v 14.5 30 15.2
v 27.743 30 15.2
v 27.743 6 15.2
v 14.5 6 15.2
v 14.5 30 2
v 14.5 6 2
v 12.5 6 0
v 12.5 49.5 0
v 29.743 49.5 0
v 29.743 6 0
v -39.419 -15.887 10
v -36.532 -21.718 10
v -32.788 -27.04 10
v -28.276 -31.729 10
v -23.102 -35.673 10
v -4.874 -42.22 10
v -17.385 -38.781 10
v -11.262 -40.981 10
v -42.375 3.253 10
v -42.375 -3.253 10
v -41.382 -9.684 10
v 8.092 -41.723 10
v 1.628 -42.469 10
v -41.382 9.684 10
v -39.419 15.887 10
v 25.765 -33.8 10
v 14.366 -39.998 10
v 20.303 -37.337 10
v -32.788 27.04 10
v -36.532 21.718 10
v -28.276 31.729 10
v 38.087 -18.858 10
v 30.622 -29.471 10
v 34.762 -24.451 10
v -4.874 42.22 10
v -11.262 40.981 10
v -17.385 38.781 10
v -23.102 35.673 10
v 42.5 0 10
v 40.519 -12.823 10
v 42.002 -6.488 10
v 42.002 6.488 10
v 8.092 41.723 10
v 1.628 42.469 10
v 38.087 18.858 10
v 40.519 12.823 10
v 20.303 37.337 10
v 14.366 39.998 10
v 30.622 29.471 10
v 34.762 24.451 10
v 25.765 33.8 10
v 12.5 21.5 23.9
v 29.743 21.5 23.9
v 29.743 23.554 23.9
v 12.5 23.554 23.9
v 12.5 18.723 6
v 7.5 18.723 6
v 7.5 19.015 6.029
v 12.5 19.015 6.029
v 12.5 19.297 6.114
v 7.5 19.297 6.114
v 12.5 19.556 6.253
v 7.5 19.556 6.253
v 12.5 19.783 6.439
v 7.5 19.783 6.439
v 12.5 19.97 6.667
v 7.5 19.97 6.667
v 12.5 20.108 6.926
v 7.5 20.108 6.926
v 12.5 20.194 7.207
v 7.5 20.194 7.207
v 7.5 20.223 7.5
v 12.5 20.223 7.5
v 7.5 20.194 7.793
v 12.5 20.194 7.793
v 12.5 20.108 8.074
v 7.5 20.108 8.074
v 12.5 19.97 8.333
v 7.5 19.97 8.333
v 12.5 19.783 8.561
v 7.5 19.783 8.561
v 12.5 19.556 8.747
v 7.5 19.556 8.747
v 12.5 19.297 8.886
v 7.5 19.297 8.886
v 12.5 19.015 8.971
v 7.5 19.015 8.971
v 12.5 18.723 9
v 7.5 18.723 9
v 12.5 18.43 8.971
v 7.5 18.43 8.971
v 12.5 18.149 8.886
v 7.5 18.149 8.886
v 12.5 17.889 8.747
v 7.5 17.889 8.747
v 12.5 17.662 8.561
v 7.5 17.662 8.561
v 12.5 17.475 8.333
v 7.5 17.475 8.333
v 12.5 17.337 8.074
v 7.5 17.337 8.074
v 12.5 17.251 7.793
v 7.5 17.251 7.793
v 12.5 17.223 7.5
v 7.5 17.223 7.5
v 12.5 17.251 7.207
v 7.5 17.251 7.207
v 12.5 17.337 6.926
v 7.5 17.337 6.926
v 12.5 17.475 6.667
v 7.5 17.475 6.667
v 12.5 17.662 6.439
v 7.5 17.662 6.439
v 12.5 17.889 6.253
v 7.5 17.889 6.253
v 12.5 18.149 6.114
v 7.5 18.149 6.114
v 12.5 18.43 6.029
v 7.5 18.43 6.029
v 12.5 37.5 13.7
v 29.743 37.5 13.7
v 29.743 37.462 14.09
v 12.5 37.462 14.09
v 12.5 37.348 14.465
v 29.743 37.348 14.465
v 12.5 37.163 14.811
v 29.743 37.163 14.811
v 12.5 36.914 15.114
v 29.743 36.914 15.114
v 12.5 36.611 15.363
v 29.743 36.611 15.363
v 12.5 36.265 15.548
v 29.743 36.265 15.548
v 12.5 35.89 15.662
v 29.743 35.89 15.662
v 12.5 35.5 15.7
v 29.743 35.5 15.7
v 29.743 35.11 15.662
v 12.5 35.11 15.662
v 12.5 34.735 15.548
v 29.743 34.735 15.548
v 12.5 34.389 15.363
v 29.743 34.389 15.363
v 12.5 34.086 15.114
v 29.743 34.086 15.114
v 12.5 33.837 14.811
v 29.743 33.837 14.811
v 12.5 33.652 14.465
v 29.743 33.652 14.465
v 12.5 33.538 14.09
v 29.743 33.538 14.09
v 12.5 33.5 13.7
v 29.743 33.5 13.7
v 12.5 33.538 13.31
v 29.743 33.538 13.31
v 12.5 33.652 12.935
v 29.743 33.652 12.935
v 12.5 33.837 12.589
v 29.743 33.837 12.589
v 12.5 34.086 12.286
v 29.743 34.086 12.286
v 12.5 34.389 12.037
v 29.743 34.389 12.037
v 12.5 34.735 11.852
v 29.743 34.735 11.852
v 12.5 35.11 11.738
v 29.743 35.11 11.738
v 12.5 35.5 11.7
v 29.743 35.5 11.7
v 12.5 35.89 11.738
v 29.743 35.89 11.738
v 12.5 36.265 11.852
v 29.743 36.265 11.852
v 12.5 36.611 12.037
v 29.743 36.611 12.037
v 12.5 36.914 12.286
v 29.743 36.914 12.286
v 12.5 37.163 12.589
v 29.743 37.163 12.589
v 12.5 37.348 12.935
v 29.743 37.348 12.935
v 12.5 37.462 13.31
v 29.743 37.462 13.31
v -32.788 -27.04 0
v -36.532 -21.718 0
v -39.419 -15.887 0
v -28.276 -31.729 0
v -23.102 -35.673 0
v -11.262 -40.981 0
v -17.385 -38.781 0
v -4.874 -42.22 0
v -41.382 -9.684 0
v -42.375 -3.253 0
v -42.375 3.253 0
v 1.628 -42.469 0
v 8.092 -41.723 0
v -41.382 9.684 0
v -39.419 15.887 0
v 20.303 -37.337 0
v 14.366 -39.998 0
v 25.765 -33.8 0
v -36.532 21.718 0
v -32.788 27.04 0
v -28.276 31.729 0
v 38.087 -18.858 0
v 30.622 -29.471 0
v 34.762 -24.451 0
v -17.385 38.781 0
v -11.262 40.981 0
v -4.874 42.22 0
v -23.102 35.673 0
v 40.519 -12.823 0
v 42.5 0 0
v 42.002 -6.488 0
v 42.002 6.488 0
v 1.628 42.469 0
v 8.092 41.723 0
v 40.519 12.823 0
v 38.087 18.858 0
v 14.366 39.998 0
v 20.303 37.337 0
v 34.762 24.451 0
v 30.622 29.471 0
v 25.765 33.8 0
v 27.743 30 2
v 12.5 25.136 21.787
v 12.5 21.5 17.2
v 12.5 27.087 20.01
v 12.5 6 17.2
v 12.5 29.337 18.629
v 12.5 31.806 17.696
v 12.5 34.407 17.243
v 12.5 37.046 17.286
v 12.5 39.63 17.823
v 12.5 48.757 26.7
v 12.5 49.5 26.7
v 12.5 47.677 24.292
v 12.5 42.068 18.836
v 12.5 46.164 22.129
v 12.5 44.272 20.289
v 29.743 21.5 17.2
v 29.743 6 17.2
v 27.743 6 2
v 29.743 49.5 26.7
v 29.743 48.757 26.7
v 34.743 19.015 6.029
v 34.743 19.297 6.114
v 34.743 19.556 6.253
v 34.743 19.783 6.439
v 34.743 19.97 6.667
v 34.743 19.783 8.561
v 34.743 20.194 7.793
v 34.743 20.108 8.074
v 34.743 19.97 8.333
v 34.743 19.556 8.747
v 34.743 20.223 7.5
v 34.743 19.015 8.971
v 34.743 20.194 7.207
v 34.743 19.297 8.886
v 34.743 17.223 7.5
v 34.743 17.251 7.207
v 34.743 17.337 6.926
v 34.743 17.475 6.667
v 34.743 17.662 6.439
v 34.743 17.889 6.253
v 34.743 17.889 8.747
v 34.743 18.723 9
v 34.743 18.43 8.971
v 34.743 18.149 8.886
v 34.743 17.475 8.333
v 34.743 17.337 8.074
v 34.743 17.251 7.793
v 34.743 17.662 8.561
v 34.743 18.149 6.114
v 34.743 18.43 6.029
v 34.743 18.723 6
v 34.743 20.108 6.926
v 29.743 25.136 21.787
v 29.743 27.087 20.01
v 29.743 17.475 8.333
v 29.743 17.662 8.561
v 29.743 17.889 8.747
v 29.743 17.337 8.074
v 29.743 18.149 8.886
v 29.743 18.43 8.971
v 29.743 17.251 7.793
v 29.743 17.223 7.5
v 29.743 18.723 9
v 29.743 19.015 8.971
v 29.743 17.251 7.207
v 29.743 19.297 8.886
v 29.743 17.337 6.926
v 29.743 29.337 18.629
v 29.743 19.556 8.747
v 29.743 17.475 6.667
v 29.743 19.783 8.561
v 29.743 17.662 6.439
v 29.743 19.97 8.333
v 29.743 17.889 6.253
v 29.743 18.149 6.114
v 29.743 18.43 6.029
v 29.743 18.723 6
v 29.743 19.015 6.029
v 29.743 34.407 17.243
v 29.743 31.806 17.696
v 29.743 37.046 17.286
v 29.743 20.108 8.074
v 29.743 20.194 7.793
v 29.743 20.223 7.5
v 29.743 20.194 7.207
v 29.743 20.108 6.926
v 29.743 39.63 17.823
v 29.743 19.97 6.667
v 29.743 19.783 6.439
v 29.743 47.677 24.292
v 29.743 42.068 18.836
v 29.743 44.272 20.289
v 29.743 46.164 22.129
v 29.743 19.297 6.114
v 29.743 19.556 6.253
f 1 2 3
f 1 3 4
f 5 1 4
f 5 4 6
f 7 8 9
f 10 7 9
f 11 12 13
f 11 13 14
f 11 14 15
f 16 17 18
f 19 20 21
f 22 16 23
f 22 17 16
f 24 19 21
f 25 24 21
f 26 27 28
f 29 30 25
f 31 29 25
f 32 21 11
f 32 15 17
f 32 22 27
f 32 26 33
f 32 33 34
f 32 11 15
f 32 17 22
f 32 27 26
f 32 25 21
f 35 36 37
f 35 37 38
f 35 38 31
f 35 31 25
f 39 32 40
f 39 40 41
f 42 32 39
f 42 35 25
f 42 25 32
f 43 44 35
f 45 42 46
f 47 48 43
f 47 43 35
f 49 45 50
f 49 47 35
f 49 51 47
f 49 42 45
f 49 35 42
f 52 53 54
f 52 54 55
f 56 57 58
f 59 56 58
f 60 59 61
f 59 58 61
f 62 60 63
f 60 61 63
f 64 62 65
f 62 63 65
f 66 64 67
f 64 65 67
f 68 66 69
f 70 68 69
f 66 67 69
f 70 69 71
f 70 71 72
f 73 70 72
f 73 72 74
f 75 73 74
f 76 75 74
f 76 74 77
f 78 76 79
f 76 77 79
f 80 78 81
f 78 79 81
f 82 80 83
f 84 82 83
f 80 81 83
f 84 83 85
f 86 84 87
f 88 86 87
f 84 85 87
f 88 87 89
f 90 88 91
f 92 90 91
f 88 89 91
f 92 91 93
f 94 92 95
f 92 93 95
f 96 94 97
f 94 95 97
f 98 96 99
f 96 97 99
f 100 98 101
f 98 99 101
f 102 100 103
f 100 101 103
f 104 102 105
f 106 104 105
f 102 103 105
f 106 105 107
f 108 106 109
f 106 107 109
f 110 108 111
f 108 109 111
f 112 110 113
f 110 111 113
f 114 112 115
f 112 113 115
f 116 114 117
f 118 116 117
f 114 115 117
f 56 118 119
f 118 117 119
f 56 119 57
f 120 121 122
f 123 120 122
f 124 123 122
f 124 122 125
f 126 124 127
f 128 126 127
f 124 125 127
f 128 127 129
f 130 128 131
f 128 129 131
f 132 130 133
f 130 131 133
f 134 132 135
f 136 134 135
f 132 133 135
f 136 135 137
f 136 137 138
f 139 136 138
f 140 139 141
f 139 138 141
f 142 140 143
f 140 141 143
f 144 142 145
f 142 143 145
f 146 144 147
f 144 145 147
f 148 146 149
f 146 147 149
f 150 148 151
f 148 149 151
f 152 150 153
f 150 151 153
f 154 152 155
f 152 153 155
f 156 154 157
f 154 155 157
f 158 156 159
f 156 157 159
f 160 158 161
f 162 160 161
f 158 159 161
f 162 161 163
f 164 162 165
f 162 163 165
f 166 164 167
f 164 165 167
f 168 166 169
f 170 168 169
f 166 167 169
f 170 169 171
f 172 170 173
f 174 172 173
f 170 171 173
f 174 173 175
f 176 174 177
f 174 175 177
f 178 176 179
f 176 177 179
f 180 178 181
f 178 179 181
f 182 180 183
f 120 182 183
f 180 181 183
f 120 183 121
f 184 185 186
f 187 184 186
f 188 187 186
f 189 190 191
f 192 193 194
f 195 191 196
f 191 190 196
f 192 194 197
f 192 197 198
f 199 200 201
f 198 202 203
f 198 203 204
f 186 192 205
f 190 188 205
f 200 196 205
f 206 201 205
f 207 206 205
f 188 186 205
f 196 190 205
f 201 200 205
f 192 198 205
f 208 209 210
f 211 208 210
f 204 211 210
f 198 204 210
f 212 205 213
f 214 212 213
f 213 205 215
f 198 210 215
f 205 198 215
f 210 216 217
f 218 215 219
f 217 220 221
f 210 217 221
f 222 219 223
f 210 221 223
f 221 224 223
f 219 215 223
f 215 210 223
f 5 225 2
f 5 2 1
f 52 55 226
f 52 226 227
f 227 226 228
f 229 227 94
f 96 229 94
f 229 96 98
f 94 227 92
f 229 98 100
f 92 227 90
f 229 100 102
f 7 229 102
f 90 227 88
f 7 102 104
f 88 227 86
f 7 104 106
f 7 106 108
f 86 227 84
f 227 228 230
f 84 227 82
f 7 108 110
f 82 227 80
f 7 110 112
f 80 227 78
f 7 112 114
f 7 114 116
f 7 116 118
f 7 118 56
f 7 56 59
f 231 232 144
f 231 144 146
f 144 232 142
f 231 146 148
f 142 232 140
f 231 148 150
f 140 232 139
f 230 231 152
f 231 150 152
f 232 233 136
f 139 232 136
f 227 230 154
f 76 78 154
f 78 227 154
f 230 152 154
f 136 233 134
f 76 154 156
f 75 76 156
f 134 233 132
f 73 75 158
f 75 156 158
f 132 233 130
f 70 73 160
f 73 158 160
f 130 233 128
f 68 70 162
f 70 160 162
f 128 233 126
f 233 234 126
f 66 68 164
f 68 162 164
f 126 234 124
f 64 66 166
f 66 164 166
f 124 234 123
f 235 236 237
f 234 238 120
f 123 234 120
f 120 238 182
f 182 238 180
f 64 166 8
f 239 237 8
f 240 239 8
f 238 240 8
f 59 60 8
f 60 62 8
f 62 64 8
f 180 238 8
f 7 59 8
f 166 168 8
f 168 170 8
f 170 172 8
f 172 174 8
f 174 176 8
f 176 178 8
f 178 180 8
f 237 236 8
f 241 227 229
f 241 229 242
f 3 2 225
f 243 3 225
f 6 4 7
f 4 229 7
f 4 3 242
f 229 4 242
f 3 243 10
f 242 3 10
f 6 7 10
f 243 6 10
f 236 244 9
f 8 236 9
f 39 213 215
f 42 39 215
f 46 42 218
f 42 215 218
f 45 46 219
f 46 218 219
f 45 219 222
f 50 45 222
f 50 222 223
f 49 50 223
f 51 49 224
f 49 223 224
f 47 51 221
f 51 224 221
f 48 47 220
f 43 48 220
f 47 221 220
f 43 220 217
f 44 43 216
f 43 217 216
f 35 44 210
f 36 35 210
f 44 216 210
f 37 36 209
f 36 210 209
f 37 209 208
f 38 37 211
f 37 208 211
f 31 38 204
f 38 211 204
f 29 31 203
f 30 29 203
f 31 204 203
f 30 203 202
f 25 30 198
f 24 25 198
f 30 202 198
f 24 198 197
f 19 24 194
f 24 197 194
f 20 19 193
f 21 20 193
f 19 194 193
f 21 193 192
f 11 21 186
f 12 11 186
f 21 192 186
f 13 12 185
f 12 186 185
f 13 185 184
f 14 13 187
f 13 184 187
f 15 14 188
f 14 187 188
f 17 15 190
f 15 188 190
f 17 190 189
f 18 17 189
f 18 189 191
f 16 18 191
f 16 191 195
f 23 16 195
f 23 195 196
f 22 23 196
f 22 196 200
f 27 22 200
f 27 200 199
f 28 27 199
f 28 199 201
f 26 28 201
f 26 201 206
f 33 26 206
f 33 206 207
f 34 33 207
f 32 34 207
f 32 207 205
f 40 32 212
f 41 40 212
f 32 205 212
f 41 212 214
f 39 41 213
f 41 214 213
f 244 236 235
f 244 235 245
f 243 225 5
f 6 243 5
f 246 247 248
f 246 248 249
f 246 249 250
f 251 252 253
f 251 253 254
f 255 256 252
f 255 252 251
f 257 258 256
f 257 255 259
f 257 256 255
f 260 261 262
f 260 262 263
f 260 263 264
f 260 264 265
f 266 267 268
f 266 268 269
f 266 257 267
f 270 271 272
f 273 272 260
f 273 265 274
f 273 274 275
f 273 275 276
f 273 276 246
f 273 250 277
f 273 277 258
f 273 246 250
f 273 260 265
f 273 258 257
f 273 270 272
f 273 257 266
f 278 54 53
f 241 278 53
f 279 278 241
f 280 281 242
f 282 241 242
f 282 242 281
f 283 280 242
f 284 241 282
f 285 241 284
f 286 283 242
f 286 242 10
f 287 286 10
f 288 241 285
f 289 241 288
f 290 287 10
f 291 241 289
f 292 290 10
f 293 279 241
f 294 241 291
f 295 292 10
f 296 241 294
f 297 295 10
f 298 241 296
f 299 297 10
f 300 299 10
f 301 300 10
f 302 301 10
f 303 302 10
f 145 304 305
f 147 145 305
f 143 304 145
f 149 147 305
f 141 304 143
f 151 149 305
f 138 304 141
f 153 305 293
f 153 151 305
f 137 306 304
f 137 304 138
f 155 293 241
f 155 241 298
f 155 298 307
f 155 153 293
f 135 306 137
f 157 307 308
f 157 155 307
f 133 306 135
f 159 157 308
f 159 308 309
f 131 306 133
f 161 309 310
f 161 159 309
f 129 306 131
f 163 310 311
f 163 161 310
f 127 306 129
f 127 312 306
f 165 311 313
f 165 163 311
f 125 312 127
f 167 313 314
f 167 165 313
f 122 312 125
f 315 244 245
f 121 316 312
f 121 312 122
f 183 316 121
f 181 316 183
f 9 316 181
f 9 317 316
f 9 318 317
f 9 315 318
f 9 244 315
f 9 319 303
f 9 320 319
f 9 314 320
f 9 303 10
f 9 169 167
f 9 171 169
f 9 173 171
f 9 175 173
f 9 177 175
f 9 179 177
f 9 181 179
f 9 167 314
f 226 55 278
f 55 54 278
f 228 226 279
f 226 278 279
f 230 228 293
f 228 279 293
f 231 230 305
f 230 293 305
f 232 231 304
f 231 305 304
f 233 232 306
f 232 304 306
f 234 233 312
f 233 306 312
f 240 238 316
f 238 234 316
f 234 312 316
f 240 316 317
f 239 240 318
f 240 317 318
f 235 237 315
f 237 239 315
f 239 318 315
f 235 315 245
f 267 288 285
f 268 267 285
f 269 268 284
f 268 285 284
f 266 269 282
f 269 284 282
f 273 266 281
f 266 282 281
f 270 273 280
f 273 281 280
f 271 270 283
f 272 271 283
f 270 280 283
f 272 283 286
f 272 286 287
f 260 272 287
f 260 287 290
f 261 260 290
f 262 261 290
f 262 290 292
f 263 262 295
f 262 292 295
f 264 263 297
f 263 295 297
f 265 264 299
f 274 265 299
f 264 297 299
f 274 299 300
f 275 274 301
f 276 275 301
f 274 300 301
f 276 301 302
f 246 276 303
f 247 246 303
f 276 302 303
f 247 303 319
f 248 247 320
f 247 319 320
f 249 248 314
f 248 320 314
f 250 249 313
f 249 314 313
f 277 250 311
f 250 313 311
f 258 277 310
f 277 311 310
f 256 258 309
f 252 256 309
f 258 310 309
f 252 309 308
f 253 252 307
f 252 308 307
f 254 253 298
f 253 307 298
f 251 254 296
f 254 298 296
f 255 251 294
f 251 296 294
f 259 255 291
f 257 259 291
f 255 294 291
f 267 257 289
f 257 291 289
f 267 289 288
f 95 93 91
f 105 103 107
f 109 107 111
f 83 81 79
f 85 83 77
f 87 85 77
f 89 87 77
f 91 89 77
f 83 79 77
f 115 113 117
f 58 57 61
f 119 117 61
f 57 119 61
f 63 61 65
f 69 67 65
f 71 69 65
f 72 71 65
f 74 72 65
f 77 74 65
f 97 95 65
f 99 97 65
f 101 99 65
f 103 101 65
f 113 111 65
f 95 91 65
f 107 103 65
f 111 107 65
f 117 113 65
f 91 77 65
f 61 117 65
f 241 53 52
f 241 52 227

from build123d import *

# Parameters (mm, degrees)
SKETCH4_R               = 42.5
BASE_DEPTH              = 10
SKETCH5_W               = 17.242861366
SKETCH5_H               = 43.5
BOSS_EXTRUDE1_DEPTH     = 17.2
SKETCH6_W               = 13.242861366
SKETCH6_H               = 13.2
CUT_EXTRUDE1_DEPTH      = 24
SKETCH9_R               = 1.5
BOSS_EXTRUDE2_DEPTH     = 5
WRAP1_START             = -22.242861366
WRAP1_OUTLINE_R         = 1.5
WRAP1_DEPTH             = 5
SKETCH14_W              = 14
SKETCH14_H              = 28
BOSS_EXTRUDE4_DEPTH     = 17.242861366
SKETCH16_R              = 14
CUT_EXTRUDE2_DEPTH      = 17.242861366
CUT_EXTRUDE4_REACH      = 108.036
SKETCH19_W              = 17.242861366
SKETCH19_H              = 4.5
CUT_EXTRUDE6_REACH      = 71.795
CUT_EXTRUDE6_END_RADIUS = 14
SKETCH22_W              = 17.242861366
SKETCH22_H              = 2.8
SKETCH23_R              = 2
CUT_EXTRUDE7_DEPTH      = 17.242861366


# Read off the part's stored shape, not the designer's step: Wrap1
with BuildPart() as part:
    # Sketch4 → base (new body)
    with BuildSketch(Plane.XY):
        Circle(SKETCH4_R)
    extrude(amount=BASE_DEPTH)


with BuildPart() as body_2:
    # Sketch5 → Boss-Extrude1 (new body)
    with BuildSketch(Plane.XY):
        with Locations((21.121430683, 27.75)):
            Rectangle(SKETCH5_W, SKETCH5_H)
    extrude(amount=BOSS_EXTRUDE1_DEPTH)

    # Sketch6 → Cut-Extrude1 (cut)
    with BuildSketch(Plane(origin=(0, 6, 0), x_dir=(-1, 0, 0), z_dir=(0, -1, 0))):
        with Locations((-21.121430683, -8.6)):
            Rectangle(SKETCH6_W, SKETCH6_H)
    extrude(amount=-CUT_EXTRUDE1_DEPTH, mode=Mode.SUBTRACT)

    # Sketch9 → Boss-Extrude2 (add)
    with BuildSketch(Plane(origin=(29.742861366, 0, 0), x_dir=(0, 0, -1), z_dir=(1, 0, 0))):
        with Locations(Location((-7.5, 18.722537456, 0), (0, 0, 180))):
            Circle(SKETCH9_R)
    extrude(amount=BOSS_EXTRUDE2_DEPTH)

    # Wrap1 outline → Wrap1 (add)
    with BuildSketch(Plane(origin=(29.742861366, 0, 0), x_dir=(0, 0, -1), z_dir=(1, 0, 0)).offset(WRAP1_START)):
        with Locations((-7.5, 18.722537456)):
            Circle(WRAP1_OUTLINE_R)
    extrude(amount=WRAP1_DEPTH)

    # Sketch14 → Boss-Extrude4 (add)
    with BuildSketch(Plane(origin=(29.742861366, 0, 0), x_dir=(0, 0, -1), z_dir=(1, 0, 0))):
        with Locations((-24.2, 35.5)):
            Rectangle(SKETCH14_W, SKETCH14_H)
    extrude(amount=-BOSS_EXTRUDE4_DEPTH)

    # Sketch16 → Cut-Extrude2 (cut)
    with BuildSketch(Plane(origin=(29.742861366, 0, 0), x_dir=(0, 0, -1), z_dir=(1, 0, 0))):
        with Locations((-31.2, 35.5)):
            Circle(SKETCH16_R)
    extrude(amount=-CUT_EXTRUDE2_DEPTH, mode=Mode.SUBTRACT)

    # Cut-Extrude4: up to this face of the body (flat: up to its plane)
    cut_extrude4_end = Plane(body_2.part.faces().sort_by_distance((21.121430683, 21.5, 24.2))[0])
    # Sketch19 → Cut-Extrude4 (cut, up to the picked face)
    with BuildSketch(Plane(origin=(0, 49.5, 0), x_dir=(1, 0, 0), z_dir=(0, 1, 0)), mode=Mode.PRIVATE) as cut_extrude4_sk1:
        with Locations((21.121430683, -28.95)):
            Rectangle(SKETCH19_W, SKETCH19_H)
    cut_extrude4_tool1 = split(extrude(cut_extrude4_sk1.sketch, amount=-CUT_EXTRUDE4_REACH, mode=Mode.PRIVATE), bisect_by=cut_extrude4_end, keep=Keep.BOTH, mode=Mode.PRIVATE)
    add(cut_extrude4_tool1.solids().sort_by(Axis((21.121431, 49.5, 28.95), (0, -1, 0)))[0], mode=Mode.SUBTRACT)

    # Cut-Extrude6: up to this cylinder (the profile starts outside it)
    cut_extrude6_end = Plane(origin=(21.121431, 35.5, 31.2), z_dir=(1, 0, 0)) * Cylinder(CUT_EXTRUDE6_END_RADIUS, 172.59, mode=Mode.PRIVATE)
    # Sketch22 → Cut-Extrude6 (cut, up to the surface)
    with BuildSketch(Plane(origin=(0, 6, 0), x_dir=(-1, 0, 0), z_dir=(0, -1, 0)), mode=Mode.PRIVATE) as cut_extrude6_sk1:
        with Locations((-21.121430683, -25.3)):
            Rectangle(SKETCH22_W, SKETCH22_H)
    cut_extrude6_tool1 = extrude(cut_extrude6_sk1.sketch, amount=-CUT_EXTRUDE6_REACH, mode=Mode.PRIVATE) - cut_extrude6_end
    add(cut_extrude6_tool1.solids().sort_by_distance((21.121431, 6, 25.3))[0], mode=Mode.SUBTRACT)

    # Sketch23 → Cut-Extrude7 (cut)
    with BuildSketch(Plane(origin=(29.742861366, 0, 0), x_dir=(0, 0, -1), z_dir=(1, 0, 0))):
        with Locations(Location((-13.7, 35.5, 0), (0, 0, 90))):
            Circle(SKETCH23_R)
    extrude(amount=-CUT_EXTRUDE7_DEPTH, mode=Mode.SUBTRACT)


solid = Compound([part.part, body_2.part])
